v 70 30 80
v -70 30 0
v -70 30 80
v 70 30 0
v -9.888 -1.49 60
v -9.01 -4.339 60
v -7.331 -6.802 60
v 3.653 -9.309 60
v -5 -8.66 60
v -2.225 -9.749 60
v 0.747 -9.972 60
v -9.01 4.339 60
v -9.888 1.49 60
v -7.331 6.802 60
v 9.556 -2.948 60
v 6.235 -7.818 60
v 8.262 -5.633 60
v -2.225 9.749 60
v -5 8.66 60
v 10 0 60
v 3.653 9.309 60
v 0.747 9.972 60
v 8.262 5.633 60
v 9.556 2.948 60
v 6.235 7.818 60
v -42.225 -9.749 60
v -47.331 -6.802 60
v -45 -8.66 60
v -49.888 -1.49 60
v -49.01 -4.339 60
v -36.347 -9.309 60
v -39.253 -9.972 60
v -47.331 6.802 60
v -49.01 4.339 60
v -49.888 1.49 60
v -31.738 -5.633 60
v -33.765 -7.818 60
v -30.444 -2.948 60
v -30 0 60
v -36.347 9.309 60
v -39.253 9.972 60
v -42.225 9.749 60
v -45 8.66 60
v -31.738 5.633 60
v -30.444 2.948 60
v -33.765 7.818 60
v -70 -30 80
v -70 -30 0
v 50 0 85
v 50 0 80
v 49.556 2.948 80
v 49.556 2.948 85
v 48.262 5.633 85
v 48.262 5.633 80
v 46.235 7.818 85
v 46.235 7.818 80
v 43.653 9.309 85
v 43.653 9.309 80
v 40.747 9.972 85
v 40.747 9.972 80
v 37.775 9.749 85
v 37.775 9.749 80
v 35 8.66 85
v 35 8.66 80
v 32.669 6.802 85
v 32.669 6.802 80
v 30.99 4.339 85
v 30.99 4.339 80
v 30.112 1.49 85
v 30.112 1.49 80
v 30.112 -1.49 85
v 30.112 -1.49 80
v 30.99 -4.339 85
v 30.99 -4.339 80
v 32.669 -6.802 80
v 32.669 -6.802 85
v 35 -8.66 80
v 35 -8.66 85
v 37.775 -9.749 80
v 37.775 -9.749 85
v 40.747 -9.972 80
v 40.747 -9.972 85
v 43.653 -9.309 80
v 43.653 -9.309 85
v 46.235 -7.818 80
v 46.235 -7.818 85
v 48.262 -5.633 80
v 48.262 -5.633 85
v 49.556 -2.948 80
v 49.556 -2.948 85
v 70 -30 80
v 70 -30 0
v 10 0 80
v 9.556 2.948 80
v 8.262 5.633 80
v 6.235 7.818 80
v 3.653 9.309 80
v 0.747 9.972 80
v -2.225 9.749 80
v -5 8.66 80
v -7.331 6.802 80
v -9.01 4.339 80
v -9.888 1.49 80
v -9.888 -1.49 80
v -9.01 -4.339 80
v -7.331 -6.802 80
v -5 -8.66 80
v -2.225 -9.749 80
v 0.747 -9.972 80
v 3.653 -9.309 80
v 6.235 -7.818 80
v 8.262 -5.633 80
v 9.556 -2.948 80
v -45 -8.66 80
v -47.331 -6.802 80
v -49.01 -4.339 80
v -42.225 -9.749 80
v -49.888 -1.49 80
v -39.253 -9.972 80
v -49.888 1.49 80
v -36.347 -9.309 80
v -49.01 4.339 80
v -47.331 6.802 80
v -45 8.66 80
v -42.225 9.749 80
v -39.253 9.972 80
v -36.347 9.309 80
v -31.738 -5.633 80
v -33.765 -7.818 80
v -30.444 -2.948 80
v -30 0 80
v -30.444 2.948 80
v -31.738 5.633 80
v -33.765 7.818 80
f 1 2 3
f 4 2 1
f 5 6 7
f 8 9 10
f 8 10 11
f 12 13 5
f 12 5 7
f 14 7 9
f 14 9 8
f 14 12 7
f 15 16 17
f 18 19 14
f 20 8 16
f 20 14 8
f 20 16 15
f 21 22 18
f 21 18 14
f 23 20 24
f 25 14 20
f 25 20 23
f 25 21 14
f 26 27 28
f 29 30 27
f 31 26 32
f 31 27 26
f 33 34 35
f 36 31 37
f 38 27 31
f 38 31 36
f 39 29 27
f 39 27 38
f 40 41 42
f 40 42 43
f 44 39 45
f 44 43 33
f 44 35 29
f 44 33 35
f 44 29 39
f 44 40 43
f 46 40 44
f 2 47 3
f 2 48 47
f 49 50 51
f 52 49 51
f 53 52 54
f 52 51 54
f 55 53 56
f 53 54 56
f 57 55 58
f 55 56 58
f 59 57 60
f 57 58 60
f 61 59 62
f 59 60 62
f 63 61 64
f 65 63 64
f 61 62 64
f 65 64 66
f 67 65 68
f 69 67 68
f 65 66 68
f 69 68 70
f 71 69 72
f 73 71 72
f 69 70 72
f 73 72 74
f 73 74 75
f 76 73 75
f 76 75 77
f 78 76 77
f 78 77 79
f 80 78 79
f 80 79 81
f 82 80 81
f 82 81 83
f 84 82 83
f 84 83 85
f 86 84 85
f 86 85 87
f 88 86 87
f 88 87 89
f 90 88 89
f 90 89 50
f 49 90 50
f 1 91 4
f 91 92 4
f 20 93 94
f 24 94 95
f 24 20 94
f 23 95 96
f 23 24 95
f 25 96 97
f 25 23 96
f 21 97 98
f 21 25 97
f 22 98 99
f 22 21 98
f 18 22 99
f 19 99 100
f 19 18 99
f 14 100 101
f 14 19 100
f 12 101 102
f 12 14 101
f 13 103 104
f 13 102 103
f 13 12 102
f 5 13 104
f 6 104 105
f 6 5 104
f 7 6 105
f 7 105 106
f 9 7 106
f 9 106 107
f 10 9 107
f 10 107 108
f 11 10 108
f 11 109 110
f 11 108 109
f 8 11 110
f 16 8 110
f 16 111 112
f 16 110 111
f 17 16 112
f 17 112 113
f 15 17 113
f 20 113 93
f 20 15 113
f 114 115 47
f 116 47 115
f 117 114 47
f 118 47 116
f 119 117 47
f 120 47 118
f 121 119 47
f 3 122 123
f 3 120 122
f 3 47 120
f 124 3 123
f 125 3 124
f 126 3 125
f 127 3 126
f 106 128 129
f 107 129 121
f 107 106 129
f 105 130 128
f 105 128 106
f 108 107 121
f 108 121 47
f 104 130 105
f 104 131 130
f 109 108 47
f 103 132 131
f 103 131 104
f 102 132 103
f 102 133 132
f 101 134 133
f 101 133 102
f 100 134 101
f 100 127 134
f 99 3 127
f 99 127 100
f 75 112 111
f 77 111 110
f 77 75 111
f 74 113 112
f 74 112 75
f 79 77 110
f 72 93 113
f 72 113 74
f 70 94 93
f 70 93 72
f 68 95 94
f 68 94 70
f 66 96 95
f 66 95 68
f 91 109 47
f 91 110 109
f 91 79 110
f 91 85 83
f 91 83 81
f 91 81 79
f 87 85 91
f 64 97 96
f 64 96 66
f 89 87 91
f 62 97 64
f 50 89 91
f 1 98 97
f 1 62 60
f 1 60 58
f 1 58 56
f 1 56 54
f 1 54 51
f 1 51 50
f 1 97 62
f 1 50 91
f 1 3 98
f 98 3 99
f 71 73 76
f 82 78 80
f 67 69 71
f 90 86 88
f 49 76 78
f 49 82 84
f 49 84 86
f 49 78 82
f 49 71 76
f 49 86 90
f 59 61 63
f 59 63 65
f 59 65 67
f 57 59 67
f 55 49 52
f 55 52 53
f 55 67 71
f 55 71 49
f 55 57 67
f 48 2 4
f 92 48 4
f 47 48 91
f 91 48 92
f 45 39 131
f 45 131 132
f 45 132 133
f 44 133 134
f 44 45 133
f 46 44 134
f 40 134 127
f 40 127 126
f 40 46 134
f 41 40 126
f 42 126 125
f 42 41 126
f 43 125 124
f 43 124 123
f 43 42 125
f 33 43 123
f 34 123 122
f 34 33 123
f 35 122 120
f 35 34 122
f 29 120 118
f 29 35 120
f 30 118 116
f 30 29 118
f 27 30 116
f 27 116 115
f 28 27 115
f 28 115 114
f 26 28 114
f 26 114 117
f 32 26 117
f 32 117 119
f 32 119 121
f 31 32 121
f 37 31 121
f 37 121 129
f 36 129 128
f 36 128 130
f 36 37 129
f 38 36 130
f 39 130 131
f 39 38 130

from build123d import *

# Parameters (mm, degrees)
F0_W     = 140
F0_H     = 60
F1_DEPTH = 60
F2_W     = 140
F2_H     = 60
F2_R     = 10
F5_DEPTH = 20
F4_R     = 10
F8_DEPTH = 500
F3_R     = 10
F9_DEPTH = 25


with BuildPart() as f1:
    # F0 (on Top) → F1 (new body)
    with BuildSketch(Plane.XY):
        Rectangle(F0_W, F0_H)
    extrude(amount=F1_DEPTH)

    # F2 (on face) → F5 (join)
    with BuildSketch(Plane.XY.offset(60)):
        Rectangle(F2_W, F2_H)
        with Locations((-40, 0)):
            Circle(F2_R, mode=Mode.SUBTRACT)
    extrude(amount=F5_DEPTH)

    # F4 (on face) → F8 (cut)
    with BuildSketch(Plane.XY.offset(60)):
        Circle(F4_R)
    extrude(amount=F8_DEPTH, mode=Mode.SUBTRACT)

    # F3 (on face) → F9 (join)
    with BuildSketch(Plane.XY.offset(60)):
        with Locations((40, 0)):
            Circle(F3_R)
    extrude(amount=F9_DEPTH)


solid = f1.part
